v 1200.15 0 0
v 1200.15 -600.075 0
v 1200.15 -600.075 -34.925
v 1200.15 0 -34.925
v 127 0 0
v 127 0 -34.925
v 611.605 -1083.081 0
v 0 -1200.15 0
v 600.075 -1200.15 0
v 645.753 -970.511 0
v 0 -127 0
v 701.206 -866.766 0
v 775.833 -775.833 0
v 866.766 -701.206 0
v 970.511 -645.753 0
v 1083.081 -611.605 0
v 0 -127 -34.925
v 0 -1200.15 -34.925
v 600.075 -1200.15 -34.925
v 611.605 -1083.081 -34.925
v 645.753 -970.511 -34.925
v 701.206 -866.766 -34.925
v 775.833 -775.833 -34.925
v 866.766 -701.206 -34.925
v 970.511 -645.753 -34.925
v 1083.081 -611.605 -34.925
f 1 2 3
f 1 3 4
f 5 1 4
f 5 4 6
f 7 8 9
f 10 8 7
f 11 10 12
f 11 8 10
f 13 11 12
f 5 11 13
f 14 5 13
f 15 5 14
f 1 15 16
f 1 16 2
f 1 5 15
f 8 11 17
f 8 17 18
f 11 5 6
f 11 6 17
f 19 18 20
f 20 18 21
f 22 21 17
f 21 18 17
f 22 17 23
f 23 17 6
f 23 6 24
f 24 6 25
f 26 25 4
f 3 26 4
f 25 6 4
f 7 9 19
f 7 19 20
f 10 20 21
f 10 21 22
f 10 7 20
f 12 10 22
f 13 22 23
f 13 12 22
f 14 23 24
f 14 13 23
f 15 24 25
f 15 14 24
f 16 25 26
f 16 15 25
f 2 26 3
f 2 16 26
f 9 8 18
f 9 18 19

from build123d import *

# Parameters (mm, degrees)
F1_DEPTH = 34.925


with BuildPart() as f1:
    # F0 (on Top) → F1 (new body)
    with BuildSketch(Plane.XY):
        with BuildLine():
            Line((1200.15, 0), (127, 0))
            Line((127, 0), (0, -127))
            Line((0, -127), (0, -1200.15))
            Line((0, -1200.15), (600.075, -1200.15))
            ThreePointArc((600.075, -1200.15), (775.832898, -775.832898), (1200.15, -600.075))
            Line((1200.15, -600.075), (1200.15, 0))
        make_face()
    extrude(amount=-F1_DEPTH)


solid = f1.part
